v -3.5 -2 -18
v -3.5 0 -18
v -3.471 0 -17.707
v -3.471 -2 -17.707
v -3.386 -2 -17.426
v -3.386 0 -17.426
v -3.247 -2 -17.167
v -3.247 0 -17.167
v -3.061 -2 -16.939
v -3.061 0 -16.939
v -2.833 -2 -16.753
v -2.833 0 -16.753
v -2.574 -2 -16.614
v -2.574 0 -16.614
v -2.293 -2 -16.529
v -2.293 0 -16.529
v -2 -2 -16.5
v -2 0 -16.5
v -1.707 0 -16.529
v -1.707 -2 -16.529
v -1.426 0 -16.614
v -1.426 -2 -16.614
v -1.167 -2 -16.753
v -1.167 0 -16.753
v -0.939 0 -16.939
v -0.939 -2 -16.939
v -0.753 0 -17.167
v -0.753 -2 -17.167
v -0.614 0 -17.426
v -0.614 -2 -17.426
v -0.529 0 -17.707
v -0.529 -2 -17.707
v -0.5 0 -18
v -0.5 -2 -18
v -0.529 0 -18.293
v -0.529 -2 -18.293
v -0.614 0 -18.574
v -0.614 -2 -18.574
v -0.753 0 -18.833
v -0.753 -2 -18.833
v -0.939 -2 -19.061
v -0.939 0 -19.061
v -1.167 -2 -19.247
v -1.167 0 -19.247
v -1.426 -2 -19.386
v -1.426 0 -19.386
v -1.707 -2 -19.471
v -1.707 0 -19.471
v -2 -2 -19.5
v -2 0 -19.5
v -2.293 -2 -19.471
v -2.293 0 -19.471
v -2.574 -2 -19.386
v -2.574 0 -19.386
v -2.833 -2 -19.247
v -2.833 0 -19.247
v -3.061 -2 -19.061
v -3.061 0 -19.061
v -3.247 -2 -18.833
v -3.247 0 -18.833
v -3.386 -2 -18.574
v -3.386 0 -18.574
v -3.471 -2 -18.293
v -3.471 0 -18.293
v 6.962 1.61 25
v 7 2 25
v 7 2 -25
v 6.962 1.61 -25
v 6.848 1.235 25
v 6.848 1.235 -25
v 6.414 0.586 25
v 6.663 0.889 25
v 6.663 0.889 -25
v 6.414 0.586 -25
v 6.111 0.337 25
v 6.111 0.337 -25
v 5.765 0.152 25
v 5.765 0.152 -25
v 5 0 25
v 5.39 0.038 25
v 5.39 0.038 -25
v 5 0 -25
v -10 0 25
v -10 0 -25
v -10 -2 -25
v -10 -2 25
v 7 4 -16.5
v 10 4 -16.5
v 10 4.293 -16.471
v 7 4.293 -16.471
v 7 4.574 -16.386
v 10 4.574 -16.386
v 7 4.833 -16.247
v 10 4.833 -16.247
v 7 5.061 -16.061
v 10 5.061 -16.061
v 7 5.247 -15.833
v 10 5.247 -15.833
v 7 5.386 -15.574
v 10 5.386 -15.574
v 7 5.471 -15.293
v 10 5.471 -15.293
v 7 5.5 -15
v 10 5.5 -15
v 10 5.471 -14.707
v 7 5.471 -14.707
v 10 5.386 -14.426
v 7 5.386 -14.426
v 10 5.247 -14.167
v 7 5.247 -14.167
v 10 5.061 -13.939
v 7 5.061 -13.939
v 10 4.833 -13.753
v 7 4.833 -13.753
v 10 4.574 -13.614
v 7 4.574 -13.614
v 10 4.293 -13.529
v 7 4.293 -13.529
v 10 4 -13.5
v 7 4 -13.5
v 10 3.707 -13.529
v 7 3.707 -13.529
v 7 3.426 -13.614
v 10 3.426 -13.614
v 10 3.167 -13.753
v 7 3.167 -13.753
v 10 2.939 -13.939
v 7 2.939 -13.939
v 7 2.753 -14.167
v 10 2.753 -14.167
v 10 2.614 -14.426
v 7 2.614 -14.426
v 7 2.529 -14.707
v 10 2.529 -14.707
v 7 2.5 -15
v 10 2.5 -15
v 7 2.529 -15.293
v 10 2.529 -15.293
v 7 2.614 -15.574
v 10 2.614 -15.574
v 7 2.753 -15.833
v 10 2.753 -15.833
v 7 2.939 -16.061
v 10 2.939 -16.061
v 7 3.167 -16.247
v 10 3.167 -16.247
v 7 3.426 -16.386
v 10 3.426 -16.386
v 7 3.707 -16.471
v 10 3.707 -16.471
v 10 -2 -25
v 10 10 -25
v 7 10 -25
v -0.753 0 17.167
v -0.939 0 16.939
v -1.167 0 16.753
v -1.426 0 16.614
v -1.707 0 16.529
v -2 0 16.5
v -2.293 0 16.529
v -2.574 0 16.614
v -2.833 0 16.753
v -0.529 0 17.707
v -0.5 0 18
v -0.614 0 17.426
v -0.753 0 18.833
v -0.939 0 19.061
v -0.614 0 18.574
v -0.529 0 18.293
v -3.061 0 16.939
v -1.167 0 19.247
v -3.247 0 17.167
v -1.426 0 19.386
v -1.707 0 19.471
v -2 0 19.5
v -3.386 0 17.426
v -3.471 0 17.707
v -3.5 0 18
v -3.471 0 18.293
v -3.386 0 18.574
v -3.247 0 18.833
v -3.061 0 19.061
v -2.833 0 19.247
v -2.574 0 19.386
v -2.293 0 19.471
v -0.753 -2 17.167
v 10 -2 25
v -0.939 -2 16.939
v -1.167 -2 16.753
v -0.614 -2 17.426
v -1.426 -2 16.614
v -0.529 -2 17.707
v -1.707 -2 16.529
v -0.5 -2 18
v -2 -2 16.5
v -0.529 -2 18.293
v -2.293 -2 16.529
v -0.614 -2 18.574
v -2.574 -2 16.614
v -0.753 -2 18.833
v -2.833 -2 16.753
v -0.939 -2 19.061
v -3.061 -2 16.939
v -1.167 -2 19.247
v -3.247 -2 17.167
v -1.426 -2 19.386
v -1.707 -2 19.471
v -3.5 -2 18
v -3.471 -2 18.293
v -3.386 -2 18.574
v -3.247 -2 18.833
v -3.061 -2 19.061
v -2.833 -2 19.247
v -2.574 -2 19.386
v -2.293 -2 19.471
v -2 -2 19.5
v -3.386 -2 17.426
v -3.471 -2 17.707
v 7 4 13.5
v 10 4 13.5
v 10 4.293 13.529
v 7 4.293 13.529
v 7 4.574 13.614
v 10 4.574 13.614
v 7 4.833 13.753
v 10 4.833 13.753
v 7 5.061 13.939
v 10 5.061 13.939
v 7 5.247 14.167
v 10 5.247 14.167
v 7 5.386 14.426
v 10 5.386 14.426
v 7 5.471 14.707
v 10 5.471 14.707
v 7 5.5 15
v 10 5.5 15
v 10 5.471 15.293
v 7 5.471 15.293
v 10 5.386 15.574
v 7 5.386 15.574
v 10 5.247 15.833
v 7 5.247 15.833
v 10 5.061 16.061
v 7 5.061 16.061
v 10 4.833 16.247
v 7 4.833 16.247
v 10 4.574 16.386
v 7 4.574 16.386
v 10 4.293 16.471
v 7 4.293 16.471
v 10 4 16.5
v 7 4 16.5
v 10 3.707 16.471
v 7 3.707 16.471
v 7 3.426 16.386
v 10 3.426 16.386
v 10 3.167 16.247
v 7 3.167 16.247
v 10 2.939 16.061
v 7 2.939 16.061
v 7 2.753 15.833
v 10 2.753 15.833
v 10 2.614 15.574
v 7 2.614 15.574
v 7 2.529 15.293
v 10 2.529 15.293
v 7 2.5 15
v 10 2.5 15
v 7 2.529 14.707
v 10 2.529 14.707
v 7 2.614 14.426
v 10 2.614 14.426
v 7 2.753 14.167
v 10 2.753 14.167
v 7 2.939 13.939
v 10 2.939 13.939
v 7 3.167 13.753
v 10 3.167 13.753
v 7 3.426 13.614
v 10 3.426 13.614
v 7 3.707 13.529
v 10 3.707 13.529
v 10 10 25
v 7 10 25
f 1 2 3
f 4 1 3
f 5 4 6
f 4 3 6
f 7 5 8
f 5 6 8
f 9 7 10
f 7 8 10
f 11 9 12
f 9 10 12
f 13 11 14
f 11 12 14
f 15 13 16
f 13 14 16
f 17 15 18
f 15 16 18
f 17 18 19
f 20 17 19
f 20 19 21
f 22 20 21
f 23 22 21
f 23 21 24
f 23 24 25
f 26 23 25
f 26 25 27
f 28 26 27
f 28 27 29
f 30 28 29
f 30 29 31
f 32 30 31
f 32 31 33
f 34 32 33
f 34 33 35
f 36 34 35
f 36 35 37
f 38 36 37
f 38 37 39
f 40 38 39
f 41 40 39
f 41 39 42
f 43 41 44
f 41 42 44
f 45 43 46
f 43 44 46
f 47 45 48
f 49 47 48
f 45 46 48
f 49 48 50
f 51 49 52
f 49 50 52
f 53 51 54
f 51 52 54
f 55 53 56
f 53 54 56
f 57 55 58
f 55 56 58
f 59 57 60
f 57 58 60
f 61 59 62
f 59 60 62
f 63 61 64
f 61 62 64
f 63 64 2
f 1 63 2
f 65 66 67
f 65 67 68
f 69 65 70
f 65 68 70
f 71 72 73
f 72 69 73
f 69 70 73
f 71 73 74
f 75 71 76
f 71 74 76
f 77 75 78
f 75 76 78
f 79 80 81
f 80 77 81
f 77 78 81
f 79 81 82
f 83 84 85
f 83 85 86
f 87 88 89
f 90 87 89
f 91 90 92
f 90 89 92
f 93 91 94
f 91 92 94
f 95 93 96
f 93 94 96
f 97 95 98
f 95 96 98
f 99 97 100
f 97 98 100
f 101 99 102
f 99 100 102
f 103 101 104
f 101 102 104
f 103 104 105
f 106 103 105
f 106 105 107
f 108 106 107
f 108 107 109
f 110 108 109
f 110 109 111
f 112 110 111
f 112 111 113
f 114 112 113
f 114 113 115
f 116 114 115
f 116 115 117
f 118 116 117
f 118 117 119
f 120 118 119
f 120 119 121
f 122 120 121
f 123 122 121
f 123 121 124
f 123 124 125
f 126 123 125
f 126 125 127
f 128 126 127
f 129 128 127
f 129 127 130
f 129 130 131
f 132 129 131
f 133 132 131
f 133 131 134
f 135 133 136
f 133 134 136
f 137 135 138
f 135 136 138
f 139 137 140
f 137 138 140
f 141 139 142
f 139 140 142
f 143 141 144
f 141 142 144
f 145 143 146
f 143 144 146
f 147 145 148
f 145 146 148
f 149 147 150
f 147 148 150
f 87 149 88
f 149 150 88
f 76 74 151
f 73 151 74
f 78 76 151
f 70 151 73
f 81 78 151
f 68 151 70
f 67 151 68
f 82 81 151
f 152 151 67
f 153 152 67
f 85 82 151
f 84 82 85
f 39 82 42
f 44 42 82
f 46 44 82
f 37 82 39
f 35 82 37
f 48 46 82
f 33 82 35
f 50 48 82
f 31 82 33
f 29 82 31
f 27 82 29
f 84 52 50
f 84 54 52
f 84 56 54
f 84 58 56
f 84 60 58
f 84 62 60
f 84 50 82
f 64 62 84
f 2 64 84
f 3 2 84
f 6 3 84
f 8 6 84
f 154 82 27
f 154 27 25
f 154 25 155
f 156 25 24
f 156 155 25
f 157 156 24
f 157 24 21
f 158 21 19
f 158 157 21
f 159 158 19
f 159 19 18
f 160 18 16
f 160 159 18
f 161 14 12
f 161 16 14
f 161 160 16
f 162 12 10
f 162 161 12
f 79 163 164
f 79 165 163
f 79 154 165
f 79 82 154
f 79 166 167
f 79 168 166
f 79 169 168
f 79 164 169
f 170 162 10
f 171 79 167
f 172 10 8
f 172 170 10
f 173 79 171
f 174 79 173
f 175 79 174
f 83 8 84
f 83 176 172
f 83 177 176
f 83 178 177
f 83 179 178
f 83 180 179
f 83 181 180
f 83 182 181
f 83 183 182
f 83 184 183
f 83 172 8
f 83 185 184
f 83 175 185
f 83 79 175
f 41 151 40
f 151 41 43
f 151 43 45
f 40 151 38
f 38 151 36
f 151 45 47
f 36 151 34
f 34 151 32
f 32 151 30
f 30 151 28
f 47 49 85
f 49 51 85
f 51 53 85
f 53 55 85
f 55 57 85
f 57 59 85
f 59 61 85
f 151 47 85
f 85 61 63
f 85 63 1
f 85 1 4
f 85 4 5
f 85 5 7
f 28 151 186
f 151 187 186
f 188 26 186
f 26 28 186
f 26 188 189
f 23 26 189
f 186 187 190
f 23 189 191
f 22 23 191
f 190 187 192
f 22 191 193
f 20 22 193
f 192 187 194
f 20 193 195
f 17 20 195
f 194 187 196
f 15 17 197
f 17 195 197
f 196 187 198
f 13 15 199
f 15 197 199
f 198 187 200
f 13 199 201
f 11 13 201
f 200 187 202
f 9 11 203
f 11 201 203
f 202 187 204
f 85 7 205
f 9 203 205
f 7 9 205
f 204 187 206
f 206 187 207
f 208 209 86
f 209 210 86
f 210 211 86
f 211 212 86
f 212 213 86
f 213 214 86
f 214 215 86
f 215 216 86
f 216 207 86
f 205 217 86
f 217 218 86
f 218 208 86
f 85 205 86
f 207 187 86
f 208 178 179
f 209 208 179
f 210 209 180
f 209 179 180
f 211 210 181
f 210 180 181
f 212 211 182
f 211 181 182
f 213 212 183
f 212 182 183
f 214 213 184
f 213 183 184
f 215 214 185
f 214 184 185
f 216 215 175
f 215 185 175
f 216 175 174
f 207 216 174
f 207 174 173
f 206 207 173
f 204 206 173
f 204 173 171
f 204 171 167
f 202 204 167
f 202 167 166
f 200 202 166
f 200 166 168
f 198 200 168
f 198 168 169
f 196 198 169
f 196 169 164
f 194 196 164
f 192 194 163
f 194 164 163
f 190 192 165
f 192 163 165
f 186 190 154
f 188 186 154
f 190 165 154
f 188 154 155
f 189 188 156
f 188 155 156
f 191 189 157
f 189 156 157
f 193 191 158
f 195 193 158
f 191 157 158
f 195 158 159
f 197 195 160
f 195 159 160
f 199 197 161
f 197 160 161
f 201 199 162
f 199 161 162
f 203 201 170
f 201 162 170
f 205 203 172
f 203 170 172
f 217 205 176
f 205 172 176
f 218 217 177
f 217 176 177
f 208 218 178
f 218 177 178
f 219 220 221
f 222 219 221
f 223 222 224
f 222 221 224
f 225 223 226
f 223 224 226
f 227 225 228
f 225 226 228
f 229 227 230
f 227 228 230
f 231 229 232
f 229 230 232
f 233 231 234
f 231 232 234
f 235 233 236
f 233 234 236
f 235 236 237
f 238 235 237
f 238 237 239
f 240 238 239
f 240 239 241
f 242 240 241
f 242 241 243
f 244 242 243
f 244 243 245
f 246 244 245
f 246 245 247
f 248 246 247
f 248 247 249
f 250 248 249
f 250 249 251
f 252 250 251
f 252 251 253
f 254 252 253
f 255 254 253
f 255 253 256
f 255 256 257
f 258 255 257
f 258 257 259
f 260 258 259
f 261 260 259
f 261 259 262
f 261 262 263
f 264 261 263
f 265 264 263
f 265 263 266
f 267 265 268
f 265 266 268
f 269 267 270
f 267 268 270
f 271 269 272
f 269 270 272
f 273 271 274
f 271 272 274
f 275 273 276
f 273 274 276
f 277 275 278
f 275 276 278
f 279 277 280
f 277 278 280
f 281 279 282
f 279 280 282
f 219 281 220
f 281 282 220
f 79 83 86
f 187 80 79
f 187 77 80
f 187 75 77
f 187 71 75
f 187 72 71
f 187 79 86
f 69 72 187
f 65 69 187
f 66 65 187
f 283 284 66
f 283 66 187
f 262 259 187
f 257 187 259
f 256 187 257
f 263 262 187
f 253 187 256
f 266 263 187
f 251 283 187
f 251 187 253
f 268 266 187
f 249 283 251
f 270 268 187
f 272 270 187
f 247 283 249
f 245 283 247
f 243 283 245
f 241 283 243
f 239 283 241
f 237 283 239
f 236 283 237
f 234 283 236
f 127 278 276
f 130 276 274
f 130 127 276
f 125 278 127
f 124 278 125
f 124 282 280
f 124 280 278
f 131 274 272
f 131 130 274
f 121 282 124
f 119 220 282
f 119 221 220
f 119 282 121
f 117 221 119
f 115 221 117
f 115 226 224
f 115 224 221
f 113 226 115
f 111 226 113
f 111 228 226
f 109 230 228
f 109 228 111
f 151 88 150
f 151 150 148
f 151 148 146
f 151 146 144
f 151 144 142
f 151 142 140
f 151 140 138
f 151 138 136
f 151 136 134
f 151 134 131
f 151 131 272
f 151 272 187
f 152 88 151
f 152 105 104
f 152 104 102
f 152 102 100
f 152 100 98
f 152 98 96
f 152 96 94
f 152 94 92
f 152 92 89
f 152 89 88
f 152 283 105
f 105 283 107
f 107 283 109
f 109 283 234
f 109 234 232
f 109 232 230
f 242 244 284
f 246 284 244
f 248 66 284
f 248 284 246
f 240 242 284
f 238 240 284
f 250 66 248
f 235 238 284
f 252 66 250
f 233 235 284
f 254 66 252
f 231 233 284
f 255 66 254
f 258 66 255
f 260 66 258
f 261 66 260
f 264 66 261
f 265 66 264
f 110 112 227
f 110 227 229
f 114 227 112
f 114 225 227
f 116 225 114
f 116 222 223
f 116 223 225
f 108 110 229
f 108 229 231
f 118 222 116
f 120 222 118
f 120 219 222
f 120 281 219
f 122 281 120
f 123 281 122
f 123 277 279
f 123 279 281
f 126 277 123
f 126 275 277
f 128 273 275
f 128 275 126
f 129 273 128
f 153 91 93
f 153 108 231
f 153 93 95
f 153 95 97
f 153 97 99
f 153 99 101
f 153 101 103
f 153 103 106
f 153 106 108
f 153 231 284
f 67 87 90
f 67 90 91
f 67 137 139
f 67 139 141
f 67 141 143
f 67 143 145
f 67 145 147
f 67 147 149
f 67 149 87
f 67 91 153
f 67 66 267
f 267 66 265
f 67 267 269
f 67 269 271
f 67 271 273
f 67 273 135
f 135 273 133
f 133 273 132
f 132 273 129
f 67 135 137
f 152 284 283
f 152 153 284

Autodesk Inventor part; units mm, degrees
ref_plane "YZ Plane" through (0, 0, 0) normal (1, 0, 0) x (0, 1, 0)
ref_plane "XZ Plane" through (0, 0, 0) normal (0, 1, 0) x (-1, 0, 0)
ref_plane "XY Plane" through (0, 0, 0) normal (0, 0, 1) x (1, 0, 0)
sketch "Sketch1" plane through (0, 0, 0) normal (0, 1, 0) x (-1, 0, 0)
  line L0 (10, 25) -> (-10, 25)
  line L1 (-10, 25) -> (-10, -25)
  line L2 (-10, -25) -> (10, -25)
  line L3 (10, -25) -> (10, 25)
  line L4 (10, 25) -> (-10, -25) construction
  line L5 (-10, 25) -> (10, -25) construction
  line L6 (0, 0) -> (0, -18)
  line L7 (0, -18) -> (0, 18)
  line L8 (0, 18) -> (2, 18)
  line L9 (0, -18) -> (2, -18)
  circle A0 centre (2, 18) radius 1.5
  circle A1 centre (2, -18) radius 1.5
  dimension "d0" = 20
  dimension "d1" = 50
  dimension "d2" = 18
  dimension "d3" = 36
  dimension "d4" = 2
  dimension "d5" = 2
  dimension "d6" = 3
  dimension "d7" = 3
extrude "Extrusion1" add sketch "Sketch1" against normal blind 2
sketch "Sketch2" plane through (0, 0, 0) normal (0, 1, 0) x (1, 0, 0)
  line L0 (10, 25) -> (10, -25) projected
  line L1 (10, -25) -> (7, -25)
  line L2 (10, -25) -> (-10, -25) projected
  line L3 (7, -25) -> (7, 25)
  line L4 (-10, 25) -> (10, 25) projected
  line L5 (7, 25) -> (10, 25)
  line L6 (10, 25) -> (10, -25)
  point P0 (0, 0)
  dimension "d10" = 3
extrude "Extrusion2" add sketch "Sketch2" along normal blind 10
sketch "Sketch3" plane through (10, -2, 25) normal (1, 0, 0) x (0, 0, -1)
  line L0 (50, 0) -> (0, 0) projected
  line L1 (25, 0) -> (25, 6)
  line L2 (25, 6) -> (45, 6)
  line L3 (45, 6) -> (25, 6)
  line L4 (25, 6) -> (5, 6)
  line L5 (5, 6) -> (10, 6)
  line L6 (10, 6) -> (40, 6)
  circle A0 centre (40, 6) radius 1.5
  circle A1 centre (10, 6) radius 1.5
  point P0 (25, 2)
  dimension "d13" = 6
  dimension "d14" = 20
  dimension "d15" = 20
  dimension "d16" = 20
  dimension "d17" = 5
  dimension "d18" = 30
  dimension "d19" = 3
  dimension "d20" = 3
extrude "Extrusion3" cut sketch "Sketch3" against normal blind 10
fillet "Fillet1" radius 2 1 edges at (7, 0, 0)
properties part number "IR_holder" material "Aluminum, Anodized Red"
